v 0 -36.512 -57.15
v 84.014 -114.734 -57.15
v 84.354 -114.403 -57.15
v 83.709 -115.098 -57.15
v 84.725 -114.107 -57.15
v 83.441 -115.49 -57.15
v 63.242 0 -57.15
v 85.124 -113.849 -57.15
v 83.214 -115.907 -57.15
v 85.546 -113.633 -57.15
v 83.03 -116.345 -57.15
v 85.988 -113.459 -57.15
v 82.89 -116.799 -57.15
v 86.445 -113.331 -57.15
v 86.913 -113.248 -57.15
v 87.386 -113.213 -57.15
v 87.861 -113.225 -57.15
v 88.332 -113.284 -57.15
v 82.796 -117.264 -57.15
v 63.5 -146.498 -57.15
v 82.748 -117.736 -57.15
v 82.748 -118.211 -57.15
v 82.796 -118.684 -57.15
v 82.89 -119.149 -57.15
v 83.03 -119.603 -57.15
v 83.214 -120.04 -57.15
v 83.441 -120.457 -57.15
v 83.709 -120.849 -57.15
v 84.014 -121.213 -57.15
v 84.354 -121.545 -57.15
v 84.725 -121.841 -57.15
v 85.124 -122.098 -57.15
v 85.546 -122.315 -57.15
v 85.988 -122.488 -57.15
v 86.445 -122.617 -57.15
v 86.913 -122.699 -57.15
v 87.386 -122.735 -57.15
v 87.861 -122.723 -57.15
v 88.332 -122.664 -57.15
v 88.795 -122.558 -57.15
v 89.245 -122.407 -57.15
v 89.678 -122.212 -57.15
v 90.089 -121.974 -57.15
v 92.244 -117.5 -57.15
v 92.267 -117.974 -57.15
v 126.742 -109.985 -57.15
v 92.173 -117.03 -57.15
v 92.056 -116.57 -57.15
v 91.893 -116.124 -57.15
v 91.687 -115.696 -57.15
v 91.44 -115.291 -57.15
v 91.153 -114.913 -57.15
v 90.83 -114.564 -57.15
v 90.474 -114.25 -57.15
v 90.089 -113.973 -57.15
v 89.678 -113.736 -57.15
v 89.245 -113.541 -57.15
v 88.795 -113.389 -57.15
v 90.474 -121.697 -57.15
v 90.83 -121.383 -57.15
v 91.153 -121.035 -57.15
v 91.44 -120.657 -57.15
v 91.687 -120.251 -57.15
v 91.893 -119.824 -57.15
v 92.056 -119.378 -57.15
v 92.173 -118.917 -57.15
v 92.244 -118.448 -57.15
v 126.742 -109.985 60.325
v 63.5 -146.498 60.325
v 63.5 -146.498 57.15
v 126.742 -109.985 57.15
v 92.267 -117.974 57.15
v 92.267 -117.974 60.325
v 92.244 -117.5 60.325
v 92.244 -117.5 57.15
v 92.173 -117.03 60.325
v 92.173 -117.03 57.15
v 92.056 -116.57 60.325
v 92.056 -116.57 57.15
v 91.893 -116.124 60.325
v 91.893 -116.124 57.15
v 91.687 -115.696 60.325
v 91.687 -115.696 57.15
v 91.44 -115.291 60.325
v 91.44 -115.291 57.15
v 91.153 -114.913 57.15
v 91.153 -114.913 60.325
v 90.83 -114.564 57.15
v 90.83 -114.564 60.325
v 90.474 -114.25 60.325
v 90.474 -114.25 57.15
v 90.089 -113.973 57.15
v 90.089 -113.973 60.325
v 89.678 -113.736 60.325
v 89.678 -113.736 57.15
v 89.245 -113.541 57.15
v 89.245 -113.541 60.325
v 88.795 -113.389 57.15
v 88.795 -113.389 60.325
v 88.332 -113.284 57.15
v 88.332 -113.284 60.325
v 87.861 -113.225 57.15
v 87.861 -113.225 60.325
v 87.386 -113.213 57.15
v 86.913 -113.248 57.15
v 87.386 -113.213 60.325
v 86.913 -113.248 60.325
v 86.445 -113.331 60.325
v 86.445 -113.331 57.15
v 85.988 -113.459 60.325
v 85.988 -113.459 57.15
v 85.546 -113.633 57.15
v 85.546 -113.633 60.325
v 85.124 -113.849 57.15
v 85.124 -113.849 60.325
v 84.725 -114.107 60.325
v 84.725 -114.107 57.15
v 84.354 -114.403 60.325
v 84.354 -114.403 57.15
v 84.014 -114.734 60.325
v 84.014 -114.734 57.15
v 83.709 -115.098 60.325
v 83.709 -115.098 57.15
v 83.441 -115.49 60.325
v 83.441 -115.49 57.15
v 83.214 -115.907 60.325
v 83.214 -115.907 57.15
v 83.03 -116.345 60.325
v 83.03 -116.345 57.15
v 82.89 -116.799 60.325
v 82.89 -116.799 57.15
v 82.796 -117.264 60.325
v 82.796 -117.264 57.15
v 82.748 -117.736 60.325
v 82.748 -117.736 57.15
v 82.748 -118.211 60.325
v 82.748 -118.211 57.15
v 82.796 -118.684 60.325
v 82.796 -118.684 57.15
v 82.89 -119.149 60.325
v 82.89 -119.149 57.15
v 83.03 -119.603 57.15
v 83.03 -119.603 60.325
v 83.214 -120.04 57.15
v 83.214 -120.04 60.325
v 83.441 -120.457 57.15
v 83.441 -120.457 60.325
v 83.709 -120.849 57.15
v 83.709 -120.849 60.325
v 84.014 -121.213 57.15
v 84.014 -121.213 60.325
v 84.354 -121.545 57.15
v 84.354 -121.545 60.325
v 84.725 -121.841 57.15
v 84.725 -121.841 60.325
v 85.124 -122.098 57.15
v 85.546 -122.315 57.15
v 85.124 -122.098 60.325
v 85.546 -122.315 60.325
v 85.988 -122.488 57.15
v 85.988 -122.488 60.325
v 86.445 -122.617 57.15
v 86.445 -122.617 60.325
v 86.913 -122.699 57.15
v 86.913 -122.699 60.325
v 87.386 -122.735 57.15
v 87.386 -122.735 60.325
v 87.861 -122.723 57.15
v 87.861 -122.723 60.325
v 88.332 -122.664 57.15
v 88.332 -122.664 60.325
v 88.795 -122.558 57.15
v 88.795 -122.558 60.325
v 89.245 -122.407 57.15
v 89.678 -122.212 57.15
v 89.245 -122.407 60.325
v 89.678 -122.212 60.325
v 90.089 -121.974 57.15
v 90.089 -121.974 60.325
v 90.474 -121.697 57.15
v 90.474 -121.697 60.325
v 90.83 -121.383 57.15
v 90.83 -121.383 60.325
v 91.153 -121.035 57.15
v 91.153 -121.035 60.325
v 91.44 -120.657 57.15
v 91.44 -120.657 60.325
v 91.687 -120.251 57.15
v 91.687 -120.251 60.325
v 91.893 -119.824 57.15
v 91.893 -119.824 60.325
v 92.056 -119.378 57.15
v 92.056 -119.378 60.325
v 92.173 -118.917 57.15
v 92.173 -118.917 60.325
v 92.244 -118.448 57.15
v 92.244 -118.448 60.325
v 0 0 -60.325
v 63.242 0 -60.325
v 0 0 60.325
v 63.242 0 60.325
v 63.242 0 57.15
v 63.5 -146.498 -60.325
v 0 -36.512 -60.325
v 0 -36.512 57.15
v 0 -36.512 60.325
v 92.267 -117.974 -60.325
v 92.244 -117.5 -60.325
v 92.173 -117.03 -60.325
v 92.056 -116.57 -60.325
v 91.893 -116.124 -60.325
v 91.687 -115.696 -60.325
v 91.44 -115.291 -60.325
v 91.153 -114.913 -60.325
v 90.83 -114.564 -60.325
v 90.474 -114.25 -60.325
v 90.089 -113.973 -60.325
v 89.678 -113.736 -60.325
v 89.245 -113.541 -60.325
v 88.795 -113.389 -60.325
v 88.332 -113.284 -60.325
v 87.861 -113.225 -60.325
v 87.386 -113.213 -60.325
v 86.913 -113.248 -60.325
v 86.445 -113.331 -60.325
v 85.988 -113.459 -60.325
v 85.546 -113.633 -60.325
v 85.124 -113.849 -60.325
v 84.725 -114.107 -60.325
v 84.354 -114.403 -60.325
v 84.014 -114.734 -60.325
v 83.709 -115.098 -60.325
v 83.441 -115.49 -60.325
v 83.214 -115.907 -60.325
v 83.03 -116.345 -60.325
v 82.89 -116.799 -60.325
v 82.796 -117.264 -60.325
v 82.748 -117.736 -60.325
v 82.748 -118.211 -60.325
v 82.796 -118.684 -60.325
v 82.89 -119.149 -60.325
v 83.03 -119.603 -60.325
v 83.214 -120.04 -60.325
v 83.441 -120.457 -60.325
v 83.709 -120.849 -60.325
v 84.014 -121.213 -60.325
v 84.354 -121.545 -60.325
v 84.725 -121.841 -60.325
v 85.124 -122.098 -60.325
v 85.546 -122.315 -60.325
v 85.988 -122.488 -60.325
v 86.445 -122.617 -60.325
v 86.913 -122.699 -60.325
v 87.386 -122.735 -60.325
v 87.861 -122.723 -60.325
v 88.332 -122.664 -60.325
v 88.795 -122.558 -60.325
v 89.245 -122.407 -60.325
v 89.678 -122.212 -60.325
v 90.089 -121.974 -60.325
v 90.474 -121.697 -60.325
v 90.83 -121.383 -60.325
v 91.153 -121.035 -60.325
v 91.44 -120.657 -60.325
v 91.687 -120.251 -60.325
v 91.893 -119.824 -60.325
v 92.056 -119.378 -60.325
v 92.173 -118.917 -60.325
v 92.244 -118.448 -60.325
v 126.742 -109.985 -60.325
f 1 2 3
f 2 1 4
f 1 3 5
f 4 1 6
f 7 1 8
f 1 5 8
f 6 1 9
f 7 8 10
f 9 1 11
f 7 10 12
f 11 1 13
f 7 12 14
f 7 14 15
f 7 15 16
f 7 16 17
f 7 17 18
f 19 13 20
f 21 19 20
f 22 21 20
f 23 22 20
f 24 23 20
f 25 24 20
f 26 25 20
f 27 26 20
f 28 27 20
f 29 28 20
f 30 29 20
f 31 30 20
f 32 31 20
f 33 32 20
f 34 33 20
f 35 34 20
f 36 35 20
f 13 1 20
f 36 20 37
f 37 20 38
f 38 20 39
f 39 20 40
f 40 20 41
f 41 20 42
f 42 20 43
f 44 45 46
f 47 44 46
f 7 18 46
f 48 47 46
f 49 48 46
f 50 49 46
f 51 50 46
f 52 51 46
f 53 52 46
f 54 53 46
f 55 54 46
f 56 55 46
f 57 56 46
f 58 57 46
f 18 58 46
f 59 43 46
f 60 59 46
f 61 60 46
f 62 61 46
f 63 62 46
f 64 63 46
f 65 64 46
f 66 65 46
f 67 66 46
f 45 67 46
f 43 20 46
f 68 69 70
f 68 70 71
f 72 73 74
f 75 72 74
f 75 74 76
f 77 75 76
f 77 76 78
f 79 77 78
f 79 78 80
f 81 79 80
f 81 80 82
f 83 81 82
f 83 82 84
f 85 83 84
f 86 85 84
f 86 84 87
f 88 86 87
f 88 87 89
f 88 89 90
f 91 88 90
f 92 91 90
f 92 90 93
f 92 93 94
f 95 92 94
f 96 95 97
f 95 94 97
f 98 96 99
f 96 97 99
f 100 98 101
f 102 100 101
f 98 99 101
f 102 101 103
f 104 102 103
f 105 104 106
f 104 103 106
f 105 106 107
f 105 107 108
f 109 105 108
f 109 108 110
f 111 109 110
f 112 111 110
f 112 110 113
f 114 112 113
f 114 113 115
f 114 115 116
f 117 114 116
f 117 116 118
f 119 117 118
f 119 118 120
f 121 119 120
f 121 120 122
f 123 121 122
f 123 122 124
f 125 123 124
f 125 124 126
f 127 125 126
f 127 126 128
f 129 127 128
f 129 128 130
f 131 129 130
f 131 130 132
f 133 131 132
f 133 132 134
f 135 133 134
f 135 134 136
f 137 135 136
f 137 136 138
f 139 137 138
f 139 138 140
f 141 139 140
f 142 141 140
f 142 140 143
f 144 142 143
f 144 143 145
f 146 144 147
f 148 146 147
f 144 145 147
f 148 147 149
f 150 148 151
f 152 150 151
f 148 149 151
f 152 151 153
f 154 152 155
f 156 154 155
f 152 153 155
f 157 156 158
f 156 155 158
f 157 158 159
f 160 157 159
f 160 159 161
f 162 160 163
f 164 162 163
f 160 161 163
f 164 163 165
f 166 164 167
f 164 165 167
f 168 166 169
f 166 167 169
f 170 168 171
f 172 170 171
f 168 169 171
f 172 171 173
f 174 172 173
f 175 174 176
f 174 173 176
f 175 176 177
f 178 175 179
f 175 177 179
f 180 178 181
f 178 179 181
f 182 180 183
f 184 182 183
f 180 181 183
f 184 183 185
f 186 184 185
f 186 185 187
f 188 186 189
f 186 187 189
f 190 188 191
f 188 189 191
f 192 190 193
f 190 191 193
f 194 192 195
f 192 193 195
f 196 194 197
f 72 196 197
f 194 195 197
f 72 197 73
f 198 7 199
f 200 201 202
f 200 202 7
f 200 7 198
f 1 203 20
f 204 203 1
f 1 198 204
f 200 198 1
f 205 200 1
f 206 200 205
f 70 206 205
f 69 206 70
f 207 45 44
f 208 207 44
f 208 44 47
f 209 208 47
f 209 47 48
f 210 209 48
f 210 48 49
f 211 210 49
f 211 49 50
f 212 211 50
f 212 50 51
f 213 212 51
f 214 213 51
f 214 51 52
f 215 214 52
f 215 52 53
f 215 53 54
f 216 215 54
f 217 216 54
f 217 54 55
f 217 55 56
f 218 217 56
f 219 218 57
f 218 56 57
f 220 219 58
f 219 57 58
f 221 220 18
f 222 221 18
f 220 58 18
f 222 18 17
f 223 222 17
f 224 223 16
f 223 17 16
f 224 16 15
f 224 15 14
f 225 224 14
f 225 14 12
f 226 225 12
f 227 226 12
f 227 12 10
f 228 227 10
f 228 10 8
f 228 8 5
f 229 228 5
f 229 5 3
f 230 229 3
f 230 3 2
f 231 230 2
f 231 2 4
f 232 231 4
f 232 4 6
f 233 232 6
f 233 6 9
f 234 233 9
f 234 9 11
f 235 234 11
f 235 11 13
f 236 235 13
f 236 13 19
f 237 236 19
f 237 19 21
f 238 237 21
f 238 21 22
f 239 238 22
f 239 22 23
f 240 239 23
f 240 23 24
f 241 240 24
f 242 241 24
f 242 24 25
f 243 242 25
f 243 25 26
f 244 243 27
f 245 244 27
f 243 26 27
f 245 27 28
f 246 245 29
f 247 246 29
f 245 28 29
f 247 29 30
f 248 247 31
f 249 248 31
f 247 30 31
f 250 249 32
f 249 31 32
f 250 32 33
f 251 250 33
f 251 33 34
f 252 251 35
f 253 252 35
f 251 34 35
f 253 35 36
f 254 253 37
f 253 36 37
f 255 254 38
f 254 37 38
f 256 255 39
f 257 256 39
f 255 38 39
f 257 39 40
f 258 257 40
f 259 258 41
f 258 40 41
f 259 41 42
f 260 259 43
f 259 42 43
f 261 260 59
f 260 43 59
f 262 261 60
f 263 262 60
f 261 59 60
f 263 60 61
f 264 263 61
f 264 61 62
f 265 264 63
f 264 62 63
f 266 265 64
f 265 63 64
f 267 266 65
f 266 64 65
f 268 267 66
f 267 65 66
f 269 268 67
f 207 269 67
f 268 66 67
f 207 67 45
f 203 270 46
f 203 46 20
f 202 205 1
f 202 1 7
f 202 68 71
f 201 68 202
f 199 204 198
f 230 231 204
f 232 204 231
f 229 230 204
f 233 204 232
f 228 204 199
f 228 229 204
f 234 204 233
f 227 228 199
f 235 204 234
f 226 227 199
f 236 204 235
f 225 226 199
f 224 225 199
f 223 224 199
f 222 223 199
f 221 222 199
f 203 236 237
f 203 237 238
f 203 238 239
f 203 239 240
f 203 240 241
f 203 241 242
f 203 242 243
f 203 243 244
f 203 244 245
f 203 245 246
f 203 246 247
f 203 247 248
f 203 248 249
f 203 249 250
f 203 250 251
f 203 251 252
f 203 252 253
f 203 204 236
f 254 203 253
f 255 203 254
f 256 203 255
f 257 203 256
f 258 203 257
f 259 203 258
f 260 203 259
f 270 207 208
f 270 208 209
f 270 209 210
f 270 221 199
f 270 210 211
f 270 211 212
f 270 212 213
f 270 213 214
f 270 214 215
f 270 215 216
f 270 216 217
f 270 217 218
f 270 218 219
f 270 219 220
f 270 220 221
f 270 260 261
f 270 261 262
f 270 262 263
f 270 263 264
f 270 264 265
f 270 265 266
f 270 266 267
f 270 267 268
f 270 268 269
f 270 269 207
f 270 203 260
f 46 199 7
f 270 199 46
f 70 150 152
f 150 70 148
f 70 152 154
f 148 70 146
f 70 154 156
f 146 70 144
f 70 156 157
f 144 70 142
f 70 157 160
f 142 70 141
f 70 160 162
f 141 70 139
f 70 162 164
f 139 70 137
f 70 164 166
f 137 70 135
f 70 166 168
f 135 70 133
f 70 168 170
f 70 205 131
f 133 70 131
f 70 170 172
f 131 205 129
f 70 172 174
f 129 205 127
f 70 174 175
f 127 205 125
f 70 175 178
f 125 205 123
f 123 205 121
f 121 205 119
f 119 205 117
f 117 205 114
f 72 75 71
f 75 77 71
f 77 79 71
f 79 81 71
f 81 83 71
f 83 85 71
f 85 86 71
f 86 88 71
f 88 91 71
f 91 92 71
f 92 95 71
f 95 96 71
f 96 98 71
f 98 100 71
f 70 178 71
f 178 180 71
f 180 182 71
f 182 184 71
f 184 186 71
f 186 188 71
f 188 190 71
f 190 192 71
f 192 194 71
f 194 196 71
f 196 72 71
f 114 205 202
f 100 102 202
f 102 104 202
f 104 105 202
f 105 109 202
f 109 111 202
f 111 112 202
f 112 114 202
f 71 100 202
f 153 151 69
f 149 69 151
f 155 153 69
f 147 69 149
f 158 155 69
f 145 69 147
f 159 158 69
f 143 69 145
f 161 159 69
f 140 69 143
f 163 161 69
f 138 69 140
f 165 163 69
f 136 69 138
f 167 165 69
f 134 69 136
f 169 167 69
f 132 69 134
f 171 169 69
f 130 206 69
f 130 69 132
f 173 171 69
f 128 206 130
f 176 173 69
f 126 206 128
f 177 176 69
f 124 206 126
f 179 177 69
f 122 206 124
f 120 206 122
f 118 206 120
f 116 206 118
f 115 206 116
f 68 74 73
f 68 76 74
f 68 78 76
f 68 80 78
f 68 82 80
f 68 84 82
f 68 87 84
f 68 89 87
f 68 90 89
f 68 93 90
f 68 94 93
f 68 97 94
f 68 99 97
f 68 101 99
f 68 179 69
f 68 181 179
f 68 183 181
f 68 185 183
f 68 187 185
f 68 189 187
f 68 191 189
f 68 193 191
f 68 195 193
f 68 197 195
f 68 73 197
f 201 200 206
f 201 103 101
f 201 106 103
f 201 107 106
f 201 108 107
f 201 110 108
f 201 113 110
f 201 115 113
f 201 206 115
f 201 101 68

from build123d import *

# Parameters (mm, degrees)
F1_DEPTH = 60.325
F3_DEPTH = 3.175
F5_DEPTH = 3.175
F6_R     = 4.7625
F7_DEPTH = 120.651


with BuildPart() as f1:
    # F0 (on Top) → F1 (new body, symmetric)
    with BuildSketch(Plane.XY):
        Polygon((63.241505, 0), (0, 0), (0, -36.5125), align=None)
    extrude(amount=F1_DEPTH, both=True)

    # F2 (on face) → F3 (join)
    with BuildSketch(Plane.XY.offset(60.325)):
        Polygon((63.241505, 0), (0, -36.5125), (63.5, -146.497726), (126.741505, -109.985226), align=None)
    extrude(amount=-F3_DEPTH)

    # F4 (on face) → F5 (join)
    with BuildSketch(Plane(origin=(0, 0, -60.325), x_dir=(1, 0, 0), z_dir=(0, 0, -1))):
        Polygon((63.5, 146.497726), (0, 36.5125), (63.241505, 0), (126.741505, 109.985226), align=None)
    extrude(amount=-F5_DEPTH)

    # F6 (on face) → F7 (cut, through all)
    with BuildSketch(Plane.XY.offset(60.325)):
        with Locations((87.504892, -117.973799)):
            Circle(F6_R)
    extrude(amount=-F7_DEPTH, mode=Mode.SUBTRACT)


solid = f1.part
